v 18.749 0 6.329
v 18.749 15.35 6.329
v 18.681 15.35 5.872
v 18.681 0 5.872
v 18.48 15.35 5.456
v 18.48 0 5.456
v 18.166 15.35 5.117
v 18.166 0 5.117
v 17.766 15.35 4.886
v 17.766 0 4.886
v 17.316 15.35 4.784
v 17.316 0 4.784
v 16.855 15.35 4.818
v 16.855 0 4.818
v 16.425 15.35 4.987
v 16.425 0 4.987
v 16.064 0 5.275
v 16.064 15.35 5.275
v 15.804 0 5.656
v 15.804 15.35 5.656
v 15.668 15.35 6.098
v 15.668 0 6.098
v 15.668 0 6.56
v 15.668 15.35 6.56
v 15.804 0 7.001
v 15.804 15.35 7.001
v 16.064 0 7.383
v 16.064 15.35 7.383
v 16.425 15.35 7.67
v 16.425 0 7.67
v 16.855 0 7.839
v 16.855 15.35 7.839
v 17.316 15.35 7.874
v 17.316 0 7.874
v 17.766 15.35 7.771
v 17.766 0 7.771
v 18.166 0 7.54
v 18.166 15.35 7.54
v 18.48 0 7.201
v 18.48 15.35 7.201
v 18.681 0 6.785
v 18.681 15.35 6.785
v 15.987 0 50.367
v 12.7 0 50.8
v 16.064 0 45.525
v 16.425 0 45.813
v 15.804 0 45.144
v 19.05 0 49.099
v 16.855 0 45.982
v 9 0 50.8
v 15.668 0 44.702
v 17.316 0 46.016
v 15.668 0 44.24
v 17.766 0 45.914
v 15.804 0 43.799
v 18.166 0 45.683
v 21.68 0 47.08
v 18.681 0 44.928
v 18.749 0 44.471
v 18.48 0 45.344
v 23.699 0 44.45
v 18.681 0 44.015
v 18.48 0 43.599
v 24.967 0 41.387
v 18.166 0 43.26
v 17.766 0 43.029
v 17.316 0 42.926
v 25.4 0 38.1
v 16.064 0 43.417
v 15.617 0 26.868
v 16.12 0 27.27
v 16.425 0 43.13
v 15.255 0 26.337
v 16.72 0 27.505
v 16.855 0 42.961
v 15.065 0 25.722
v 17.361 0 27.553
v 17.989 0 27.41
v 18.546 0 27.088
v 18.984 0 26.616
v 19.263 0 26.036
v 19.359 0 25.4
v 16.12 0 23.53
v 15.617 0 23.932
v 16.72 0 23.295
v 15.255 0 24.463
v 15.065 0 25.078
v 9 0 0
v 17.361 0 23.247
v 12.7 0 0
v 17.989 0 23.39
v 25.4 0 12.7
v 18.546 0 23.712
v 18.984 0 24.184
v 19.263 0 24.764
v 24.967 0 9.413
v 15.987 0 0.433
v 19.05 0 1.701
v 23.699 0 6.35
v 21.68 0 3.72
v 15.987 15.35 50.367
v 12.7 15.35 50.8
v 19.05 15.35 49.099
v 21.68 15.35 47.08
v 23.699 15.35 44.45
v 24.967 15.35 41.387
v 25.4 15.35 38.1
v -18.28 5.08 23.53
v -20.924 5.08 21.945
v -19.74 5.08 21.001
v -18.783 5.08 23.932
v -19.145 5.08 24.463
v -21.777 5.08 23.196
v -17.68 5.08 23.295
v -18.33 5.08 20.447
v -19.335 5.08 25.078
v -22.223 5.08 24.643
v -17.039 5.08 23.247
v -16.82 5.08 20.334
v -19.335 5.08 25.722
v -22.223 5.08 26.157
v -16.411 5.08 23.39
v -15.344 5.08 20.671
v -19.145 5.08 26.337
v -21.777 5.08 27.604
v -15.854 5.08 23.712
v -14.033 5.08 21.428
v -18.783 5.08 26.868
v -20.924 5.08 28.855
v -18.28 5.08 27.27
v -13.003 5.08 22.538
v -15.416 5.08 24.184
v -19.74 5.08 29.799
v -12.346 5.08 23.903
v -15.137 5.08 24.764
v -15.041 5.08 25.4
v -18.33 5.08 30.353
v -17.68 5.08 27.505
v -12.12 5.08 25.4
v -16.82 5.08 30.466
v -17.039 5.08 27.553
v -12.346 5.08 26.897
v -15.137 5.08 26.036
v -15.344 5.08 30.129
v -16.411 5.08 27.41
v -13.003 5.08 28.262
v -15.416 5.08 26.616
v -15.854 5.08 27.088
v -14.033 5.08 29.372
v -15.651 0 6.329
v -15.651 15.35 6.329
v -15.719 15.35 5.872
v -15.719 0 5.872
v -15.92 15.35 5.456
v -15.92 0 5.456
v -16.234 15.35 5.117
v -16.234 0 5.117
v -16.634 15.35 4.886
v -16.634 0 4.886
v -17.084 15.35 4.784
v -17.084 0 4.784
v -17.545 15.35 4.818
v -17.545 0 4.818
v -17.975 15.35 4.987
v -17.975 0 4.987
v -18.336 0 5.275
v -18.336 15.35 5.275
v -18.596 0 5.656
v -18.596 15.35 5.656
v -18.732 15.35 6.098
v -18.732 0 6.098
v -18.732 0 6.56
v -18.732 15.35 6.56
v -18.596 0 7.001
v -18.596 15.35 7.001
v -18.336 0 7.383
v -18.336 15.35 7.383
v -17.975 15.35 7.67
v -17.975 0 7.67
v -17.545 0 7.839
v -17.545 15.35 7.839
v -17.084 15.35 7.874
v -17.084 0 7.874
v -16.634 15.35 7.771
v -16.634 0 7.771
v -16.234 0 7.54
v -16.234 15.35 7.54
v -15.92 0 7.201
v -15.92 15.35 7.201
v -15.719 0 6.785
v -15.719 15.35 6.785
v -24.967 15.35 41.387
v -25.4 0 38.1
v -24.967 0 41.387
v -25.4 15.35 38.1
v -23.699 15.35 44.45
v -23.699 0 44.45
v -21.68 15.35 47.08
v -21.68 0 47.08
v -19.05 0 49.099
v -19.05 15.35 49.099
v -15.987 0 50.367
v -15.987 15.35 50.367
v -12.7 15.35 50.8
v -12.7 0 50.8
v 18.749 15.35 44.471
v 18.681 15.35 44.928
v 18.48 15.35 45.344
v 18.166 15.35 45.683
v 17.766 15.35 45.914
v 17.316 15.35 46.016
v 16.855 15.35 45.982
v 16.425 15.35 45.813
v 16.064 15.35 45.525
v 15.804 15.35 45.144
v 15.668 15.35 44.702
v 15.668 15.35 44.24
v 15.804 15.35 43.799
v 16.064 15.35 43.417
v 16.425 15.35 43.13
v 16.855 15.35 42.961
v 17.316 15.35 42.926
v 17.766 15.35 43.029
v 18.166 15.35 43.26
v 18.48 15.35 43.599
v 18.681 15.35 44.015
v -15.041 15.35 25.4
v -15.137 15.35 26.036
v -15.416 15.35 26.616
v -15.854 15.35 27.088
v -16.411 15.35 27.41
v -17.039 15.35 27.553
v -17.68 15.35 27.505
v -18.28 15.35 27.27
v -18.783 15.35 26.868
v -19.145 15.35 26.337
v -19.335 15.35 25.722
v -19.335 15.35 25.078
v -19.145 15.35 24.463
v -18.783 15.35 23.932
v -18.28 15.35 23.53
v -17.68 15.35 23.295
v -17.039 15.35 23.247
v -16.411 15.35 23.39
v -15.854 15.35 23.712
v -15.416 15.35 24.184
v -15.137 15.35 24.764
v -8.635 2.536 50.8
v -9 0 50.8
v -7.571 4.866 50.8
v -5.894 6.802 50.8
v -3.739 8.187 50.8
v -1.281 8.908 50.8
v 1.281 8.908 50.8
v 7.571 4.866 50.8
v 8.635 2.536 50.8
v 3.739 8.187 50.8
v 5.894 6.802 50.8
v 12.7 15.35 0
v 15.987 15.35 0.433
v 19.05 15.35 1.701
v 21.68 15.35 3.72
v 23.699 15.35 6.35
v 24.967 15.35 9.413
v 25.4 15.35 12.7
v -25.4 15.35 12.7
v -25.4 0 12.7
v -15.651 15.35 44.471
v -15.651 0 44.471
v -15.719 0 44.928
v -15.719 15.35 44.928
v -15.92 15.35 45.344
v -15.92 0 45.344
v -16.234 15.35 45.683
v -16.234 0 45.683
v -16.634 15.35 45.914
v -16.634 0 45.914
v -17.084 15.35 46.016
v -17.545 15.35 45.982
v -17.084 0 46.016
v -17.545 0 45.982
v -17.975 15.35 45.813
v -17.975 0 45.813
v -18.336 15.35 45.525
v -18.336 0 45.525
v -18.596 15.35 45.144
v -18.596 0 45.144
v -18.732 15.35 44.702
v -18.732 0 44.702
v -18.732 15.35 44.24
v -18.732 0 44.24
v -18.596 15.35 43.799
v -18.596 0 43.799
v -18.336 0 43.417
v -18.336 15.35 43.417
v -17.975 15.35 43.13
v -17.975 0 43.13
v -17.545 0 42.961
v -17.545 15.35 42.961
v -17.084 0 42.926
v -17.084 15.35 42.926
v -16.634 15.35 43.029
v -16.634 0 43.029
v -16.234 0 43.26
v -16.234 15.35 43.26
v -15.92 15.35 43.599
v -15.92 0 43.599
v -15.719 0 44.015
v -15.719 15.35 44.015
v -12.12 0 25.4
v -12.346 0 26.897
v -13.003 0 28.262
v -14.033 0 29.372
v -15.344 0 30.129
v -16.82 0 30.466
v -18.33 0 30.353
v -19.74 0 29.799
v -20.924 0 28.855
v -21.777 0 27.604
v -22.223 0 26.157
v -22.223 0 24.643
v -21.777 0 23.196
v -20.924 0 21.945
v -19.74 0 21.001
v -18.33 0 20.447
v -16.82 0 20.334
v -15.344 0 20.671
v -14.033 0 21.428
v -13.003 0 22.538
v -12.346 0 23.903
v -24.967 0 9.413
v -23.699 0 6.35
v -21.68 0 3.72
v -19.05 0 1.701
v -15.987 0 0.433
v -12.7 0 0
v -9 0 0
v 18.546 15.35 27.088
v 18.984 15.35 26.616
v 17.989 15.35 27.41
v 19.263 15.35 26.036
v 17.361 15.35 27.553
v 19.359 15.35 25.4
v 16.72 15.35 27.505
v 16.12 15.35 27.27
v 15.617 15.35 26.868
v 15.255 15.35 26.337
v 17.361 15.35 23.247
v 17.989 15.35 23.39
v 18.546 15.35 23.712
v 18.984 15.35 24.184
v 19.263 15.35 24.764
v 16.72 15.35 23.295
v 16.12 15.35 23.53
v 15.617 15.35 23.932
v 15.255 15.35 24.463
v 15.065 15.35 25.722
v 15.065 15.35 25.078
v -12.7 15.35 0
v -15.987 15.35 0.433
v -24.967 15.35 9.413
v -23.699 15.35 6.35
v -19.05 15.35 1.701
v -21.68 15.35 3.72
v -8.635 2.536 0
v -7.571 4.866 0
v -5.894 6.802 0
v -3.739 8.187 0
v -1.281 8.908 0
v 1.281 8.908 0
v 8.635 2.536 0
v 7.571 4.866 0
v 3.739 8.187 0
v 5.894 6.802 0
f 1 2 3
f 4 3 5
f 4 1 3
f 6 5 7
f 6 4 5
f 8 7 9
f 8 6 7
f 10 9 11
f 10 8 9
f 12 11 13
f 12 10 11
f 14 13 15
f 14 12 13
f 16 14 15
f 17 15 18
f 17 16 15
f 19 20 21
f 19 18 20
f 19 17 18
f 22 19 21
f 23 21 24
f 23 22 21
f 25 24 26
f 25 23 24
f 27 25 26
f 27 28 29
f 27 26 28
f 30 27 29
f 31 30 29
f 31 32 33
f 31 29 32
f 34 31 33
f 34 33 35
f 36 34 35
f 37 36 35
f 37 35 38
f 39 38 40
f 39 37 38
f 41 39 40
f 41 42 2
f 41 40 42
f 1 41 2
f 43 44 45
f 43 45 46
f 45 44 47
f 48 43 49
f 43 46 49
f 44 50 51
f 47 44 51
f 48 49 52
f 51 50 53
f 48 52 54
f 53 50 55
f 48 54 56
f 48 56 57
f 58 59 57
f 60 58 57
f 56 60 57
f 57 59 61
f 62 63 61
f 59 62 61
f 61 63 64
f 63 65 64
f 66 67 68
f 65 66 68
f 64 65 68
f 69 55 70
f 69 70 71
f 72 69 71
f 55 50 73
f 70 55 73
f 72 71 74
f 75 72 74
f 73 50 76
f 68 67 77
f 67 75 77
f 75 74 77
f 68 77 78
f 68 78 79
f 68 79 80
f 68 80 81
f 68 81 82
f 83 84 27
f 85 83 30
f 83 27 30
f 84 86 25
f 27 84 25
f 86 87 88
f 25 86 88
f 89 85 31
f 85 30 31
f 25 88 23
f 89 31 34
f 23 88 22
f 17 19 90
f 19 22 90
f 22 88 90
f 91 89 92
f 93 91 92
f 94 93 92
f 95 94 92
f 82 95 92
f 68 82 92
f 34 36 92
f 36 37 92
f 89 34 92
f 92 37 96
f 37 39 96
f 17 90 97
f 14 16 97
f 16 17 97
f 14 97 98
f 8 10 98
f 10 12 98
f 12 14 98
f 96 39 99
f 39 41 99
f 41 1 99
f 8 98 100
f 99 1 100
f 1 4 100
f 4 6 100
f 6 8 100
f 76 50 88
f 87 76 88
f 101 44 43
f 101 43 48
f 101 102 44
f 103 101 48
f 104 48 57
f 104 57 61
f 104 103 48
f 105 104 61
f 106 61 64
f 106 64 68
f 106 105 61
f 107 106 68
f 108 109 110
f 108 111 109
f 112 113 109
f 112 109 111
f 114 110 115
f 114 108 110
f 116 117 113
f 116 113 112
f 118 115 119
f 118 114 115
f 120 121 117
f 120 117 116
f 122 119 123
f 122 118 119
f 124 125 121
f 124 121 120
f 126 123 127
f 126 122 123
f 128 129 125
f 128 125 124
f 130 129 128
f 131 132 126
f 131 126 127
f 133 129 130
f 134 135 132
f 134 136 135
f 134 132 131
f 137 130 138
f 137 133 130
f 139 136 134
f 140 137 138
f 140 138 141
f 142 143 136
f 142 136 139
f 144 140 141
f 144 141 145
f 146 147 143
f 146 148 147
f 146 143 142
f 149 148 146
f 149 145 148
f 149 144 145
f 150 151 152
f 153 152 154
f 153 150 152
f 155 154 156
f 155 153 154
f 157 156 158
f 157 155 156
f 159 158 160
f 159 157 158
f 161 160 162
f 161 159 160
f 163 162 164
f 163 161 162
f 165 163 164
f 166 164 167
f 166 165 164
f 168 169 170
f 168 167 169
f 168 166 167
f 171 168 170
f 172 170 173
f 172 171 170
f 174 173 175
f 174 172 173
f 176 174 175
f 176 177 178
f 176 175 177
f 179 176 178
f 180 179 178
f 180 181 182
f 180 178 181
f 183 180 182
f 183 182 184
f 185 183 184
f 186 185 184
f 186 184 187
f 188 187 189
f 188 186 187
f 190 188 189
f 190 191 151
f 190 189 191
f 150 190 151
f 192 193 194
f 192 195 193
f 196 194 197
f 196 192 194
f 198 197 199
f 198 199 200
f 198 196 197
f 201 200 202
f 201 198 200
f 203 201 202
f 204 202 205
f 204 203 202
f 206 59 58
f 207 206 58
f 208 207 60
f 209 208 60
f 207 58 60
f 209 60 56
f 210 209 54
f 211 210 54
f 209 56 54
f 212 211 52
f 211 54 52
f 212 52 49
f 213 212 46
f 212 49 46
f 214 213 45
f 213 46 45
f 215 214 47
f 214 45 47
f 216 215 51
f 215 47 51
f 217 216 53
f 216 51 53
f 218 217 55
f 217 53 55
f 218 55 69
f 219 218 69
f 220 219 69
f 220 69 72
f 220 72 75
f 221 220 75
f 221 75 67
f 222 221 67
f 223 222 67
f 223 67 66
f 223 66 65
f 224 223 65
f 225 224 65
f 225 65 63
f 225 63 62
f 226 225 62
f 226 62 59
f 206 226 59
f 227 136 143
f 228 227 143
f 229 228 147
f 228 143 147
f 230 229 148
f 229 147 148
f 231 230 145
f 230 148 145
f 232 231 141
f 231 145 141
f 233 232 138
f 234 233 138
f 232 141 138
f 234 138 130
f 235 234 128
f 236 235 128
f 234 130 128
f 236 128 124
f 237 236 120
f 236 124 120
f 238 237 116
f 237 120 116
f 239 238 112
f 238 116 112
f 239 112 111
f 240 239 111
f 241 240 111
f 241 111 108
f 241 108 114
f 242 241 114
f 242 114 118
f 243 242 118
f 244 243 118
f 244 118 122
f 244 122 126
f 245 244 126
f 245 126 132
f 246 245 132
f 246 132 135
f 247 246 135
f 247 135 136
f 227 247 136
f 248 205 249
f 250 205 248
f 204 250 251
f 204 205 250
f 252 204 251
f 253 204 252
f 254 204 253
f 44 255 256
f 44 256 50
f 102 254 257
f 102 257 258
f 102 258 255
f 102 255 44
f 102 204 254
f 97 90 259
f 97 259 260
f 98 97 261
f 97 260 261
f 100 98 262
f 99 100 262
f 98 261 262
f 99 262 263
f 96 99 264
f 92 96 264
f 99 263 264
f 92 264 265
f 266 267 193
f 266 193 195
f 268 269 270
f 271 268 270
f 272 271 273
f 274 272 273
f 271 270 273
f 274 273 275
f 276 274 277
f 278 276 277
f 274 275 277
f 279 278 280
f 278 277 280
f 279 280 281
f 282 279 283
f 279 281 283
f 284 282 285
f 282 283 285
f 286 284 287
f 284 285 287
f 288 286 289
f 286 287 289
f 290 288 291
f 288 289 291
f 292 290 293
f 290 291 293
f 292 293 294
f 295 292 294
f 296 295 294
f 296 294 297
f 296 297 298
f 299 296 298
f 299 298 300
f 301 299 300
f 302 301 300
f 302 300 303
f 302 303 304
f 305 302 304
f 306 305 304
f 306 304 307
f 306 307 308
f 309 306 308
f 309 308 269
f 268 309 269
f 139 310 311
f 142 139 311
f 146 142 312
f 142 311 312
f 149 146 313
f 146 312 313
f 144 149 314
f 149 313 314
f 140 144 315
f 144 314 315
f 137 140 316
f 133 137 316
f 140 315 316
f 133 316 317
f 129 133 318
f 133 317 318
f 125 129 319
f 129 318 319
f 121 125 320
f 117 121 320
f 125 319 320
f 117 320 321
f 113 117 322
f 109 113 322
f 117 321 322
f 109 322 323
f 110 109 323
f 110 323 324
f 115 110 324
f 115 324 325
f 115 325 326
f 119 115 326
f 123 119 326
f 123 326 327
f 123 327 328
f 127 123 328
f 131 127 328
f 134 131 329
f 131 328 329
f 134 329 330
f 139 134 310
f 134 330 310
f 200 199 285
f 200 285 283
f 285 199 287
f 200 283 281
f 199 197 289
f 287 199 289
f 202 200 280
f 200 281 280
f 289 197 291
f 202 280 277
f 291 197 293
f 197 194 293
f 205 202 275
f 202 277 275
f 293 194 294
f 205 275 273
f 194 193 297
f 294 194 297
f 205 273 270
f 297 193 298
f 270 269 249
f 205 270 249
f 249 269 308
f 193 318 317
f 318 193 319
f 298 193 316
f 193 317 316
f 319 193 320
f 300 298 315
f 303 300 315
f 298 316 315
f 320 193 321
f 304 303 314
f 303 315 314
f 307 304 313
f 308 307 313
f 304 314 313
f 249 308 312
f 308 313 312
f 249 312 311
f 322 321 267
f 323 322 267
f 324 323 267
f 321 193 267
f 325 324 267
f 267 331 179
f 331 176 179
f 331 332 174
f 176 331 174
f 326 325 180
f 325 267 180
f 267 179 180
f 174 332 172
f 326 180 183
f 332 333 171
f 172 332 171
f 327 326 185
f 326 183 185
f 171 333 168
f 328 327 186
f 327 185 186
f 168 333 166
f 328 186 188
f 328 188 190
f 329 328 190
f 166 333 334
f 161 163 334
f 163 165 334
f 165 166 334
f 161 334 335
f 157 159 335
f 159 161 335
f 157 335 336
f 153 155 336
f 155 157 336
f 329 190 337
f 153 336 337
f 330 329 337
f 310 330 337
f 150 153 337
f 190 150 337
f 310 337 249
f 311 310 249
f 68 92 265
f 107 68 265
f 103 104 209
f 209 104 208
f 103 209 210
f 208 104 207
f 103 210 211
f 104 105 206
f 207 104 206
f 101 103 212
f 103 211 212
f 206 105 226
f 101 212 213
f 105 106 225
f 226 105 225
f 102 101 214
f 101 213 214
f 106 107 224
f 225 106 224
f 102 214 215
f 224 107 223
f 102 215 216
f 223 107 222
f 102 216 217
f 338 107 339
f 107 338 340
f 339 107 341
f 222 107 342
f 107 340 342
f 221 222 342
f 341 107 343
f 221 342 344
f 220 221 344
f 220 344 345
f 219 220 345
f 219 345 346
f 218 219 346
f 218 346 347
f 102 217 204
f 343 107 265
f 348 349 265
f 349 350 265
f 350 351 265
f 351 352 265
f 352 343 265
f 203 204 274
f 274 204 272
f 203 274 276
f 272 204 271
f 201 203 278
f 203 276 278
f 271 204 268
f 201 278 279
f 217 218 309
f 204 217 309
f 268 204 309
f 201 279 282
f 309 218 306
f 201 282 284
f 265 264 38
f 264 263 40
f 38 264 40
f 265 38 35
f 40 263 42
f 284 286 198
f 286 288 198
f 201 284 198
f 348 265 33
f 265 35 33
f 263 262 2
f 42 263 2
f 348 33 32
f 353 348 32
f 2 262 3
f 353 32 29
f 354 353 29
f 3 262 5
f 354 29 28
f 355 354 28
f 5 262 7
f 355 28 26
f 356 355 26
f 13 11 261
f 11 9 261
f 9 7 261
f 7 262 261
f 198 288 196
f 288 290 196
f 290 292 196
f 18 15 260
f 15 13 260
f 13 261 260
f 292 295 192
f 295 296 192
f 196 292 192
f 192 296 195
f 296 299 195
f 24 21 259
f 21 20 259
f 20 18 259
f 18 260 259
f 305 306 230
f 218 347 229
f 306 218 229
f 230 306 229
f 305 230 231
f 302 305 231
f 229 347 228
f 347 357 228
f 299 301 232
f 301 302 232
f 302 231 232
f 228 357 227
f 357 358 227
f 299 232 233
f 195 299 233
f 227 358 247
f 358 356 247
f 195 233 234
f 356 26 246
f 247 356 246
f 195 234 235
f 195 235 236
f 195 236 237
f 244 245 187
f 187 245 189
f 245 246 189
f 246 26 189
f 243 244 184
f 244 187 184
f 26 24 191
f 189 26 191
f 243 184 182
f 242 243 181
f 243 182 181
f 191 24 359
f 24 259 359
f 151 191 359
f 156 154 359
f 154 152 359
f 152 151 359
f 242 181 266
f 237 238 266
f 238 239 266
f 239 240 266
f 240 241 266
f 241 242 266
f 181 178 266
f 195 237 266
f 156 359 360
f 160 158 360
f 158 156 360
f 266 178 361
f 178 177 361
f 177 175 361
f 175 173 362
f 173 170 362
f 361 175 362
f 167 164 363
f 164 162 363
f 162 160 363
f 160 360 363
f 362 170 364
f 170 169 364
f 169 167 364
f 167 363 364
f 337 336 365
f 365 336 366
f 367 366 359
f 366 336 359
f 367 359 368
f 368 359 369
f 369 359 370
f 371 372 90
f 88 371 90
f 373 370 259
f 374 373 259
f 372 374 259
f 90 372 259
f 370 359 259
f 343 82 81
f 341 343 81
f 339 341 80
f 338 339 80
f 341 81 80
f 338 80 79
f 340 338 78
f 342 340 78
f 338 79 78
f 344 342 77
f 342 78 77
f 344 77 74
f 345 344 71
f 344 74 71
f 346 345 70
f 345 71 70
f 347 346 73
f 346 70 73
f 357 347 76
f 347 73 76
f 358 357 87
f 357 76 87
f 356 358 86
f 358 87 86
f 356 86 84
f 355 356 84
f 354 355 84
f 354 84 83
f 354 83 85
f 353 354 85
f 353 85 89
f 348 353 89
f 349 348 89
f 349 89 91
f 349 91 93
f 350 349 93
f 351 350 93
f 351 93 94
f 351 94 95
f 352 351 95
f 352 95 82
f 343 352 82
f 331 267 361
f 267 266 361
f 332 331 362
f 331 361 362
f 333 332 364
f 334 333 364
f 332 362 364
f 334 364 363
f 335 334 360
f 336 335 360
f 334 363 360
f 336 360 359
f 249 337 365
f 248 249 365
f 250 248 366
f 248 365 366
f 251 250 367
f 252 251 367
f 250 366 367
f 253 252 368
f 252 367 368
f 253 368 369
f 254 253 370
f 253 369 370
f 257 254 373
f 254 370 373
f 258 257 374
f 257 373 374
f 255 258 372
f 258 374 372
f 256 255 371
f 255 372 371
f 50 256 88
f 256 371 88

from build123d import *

# Parameters (mm, degrees)
F0_W      = 50.8
F0_H      = 50.8
F1_DEPTH  = 50.8
F2_R      = 9
F3_DEPTH  = 407.416
F4_W      = 60.1204171121
F4_H      = 25.4
F5_DEPTH  = 338.582
F6_R      = 5.08
F7_DEPTH  = 5.08
F8_R      = 2.159
F9_DEPTH  = 25.4
F10_R     = 1.5494
F11_DEPTH = 25.4
F12_R     = 1.5494
F12_R_2   = 2.159
F13_DEPTH = 25.4
F18_DEPTH = 72.39
F21_R     = 12.7


with BuildPart() as f1:
    # F0 (on Top) → F1 (new body)
    with BuildSketch(Plane.XY):
        Rectangle(F0_W, F0_H)
    extrude(amount=F1_DEPTH)

    # F2 (on face) → F3 (cut)
    with BuildSketch(Plane(origin=(0, 0, 0), x_dir=(1, 0, 0), z_dir=(0, 0, -1))):
        Circle(F2_R)
    extrude(amount=-F3_DEPTH, mode=Mode.SUBTRACT)

    # F4 (on face) → F5 (cut)
    with BuildSketch(Plane(origin=(0, 0, 0), x_dir=(1, 0, 0), z_dir=(0, 0, -1))):
        with Locations((4.6602085561, 12.7)):
            Rectangle(F4_W, F4_H)
    extrude(amount=-F5_DEPTH, mode=Mode.SUBTRACT)

    # F6 (on face) → F7 (cut)
    with BuildSketch(Plane.XZ):
        with Locations((-17.2, 25.4)):
            Circle(F6_R)
    extrude(amount=-F7_DEPTH, mode=Mode.SUBTRACT)

    # F8 (on face) → F9 (cut)
    with BuildSketch(Plane.XZ.offset(-5.08)):
        with Locations((-17.2, 25.4)):
            Circle(F8_R)
    extrude(amount=-F9_DEPTH, mode=Mode.SUBTRACT)

    # F10 (on face) → F11 (cut)
    with BuildSketch(Plane.XZ):
        with Locations((-17.2, 44.4713309407)):
            Circle(F10_R)
    extrude(amount=-F11_DEPTH, mode=Mode.SUBTRACT)

    # F12 (on face) → F13 (cut)
    with BuildSketch(Plane.XZ):
        with Locations((17.2, 44.4713309407)):
            Circle(F12_R)
        with Locations((17.2, 25.4)):
            Circle(F12_R_2)
    extrude(amount=-F13_DEPTH, mode=Mode.SUBTRACT)

    # F16: F1 across plane


with BuildPart() as f1_1:
    add(f1.part)
    add(f1.part.mirror(Plane(origin=(0, 13.6714489466, 25.4), x_dir=(1, 0, 0), z_dir=(0, 0, 1))), mode=Mode.INTERSECT)

    # F17 (on face) → F18 (cut)
    with BuildSketch(Plane(origin=(0, 0, 0), x_dir=(1, 0, 0), z_dir=(0, 0, -1))):
        Polygon((37.3146161437, -15.35), (0, -15.35), (-44.7141490877, -15.35), (-42.6479764283, -31.9298505783), (43.3826521039, -33.9571945369), align=None)
    extrude(amount=-F18_DEPTH, mode=Mode.SUBTRACT)

    # F21
    f21_edges = [f1_1.edges().sort_by_distance(p)[0] for p in [
        (25.4, 7.675, 50.8),
        (25.4, 7.675, 0),
        (-25.4, 7.675, 50.8),
        (-25.4, 7.675, 0),
    ]]
    fillet(f21_edges, radius=F21_R)


solid = f1_1.part
